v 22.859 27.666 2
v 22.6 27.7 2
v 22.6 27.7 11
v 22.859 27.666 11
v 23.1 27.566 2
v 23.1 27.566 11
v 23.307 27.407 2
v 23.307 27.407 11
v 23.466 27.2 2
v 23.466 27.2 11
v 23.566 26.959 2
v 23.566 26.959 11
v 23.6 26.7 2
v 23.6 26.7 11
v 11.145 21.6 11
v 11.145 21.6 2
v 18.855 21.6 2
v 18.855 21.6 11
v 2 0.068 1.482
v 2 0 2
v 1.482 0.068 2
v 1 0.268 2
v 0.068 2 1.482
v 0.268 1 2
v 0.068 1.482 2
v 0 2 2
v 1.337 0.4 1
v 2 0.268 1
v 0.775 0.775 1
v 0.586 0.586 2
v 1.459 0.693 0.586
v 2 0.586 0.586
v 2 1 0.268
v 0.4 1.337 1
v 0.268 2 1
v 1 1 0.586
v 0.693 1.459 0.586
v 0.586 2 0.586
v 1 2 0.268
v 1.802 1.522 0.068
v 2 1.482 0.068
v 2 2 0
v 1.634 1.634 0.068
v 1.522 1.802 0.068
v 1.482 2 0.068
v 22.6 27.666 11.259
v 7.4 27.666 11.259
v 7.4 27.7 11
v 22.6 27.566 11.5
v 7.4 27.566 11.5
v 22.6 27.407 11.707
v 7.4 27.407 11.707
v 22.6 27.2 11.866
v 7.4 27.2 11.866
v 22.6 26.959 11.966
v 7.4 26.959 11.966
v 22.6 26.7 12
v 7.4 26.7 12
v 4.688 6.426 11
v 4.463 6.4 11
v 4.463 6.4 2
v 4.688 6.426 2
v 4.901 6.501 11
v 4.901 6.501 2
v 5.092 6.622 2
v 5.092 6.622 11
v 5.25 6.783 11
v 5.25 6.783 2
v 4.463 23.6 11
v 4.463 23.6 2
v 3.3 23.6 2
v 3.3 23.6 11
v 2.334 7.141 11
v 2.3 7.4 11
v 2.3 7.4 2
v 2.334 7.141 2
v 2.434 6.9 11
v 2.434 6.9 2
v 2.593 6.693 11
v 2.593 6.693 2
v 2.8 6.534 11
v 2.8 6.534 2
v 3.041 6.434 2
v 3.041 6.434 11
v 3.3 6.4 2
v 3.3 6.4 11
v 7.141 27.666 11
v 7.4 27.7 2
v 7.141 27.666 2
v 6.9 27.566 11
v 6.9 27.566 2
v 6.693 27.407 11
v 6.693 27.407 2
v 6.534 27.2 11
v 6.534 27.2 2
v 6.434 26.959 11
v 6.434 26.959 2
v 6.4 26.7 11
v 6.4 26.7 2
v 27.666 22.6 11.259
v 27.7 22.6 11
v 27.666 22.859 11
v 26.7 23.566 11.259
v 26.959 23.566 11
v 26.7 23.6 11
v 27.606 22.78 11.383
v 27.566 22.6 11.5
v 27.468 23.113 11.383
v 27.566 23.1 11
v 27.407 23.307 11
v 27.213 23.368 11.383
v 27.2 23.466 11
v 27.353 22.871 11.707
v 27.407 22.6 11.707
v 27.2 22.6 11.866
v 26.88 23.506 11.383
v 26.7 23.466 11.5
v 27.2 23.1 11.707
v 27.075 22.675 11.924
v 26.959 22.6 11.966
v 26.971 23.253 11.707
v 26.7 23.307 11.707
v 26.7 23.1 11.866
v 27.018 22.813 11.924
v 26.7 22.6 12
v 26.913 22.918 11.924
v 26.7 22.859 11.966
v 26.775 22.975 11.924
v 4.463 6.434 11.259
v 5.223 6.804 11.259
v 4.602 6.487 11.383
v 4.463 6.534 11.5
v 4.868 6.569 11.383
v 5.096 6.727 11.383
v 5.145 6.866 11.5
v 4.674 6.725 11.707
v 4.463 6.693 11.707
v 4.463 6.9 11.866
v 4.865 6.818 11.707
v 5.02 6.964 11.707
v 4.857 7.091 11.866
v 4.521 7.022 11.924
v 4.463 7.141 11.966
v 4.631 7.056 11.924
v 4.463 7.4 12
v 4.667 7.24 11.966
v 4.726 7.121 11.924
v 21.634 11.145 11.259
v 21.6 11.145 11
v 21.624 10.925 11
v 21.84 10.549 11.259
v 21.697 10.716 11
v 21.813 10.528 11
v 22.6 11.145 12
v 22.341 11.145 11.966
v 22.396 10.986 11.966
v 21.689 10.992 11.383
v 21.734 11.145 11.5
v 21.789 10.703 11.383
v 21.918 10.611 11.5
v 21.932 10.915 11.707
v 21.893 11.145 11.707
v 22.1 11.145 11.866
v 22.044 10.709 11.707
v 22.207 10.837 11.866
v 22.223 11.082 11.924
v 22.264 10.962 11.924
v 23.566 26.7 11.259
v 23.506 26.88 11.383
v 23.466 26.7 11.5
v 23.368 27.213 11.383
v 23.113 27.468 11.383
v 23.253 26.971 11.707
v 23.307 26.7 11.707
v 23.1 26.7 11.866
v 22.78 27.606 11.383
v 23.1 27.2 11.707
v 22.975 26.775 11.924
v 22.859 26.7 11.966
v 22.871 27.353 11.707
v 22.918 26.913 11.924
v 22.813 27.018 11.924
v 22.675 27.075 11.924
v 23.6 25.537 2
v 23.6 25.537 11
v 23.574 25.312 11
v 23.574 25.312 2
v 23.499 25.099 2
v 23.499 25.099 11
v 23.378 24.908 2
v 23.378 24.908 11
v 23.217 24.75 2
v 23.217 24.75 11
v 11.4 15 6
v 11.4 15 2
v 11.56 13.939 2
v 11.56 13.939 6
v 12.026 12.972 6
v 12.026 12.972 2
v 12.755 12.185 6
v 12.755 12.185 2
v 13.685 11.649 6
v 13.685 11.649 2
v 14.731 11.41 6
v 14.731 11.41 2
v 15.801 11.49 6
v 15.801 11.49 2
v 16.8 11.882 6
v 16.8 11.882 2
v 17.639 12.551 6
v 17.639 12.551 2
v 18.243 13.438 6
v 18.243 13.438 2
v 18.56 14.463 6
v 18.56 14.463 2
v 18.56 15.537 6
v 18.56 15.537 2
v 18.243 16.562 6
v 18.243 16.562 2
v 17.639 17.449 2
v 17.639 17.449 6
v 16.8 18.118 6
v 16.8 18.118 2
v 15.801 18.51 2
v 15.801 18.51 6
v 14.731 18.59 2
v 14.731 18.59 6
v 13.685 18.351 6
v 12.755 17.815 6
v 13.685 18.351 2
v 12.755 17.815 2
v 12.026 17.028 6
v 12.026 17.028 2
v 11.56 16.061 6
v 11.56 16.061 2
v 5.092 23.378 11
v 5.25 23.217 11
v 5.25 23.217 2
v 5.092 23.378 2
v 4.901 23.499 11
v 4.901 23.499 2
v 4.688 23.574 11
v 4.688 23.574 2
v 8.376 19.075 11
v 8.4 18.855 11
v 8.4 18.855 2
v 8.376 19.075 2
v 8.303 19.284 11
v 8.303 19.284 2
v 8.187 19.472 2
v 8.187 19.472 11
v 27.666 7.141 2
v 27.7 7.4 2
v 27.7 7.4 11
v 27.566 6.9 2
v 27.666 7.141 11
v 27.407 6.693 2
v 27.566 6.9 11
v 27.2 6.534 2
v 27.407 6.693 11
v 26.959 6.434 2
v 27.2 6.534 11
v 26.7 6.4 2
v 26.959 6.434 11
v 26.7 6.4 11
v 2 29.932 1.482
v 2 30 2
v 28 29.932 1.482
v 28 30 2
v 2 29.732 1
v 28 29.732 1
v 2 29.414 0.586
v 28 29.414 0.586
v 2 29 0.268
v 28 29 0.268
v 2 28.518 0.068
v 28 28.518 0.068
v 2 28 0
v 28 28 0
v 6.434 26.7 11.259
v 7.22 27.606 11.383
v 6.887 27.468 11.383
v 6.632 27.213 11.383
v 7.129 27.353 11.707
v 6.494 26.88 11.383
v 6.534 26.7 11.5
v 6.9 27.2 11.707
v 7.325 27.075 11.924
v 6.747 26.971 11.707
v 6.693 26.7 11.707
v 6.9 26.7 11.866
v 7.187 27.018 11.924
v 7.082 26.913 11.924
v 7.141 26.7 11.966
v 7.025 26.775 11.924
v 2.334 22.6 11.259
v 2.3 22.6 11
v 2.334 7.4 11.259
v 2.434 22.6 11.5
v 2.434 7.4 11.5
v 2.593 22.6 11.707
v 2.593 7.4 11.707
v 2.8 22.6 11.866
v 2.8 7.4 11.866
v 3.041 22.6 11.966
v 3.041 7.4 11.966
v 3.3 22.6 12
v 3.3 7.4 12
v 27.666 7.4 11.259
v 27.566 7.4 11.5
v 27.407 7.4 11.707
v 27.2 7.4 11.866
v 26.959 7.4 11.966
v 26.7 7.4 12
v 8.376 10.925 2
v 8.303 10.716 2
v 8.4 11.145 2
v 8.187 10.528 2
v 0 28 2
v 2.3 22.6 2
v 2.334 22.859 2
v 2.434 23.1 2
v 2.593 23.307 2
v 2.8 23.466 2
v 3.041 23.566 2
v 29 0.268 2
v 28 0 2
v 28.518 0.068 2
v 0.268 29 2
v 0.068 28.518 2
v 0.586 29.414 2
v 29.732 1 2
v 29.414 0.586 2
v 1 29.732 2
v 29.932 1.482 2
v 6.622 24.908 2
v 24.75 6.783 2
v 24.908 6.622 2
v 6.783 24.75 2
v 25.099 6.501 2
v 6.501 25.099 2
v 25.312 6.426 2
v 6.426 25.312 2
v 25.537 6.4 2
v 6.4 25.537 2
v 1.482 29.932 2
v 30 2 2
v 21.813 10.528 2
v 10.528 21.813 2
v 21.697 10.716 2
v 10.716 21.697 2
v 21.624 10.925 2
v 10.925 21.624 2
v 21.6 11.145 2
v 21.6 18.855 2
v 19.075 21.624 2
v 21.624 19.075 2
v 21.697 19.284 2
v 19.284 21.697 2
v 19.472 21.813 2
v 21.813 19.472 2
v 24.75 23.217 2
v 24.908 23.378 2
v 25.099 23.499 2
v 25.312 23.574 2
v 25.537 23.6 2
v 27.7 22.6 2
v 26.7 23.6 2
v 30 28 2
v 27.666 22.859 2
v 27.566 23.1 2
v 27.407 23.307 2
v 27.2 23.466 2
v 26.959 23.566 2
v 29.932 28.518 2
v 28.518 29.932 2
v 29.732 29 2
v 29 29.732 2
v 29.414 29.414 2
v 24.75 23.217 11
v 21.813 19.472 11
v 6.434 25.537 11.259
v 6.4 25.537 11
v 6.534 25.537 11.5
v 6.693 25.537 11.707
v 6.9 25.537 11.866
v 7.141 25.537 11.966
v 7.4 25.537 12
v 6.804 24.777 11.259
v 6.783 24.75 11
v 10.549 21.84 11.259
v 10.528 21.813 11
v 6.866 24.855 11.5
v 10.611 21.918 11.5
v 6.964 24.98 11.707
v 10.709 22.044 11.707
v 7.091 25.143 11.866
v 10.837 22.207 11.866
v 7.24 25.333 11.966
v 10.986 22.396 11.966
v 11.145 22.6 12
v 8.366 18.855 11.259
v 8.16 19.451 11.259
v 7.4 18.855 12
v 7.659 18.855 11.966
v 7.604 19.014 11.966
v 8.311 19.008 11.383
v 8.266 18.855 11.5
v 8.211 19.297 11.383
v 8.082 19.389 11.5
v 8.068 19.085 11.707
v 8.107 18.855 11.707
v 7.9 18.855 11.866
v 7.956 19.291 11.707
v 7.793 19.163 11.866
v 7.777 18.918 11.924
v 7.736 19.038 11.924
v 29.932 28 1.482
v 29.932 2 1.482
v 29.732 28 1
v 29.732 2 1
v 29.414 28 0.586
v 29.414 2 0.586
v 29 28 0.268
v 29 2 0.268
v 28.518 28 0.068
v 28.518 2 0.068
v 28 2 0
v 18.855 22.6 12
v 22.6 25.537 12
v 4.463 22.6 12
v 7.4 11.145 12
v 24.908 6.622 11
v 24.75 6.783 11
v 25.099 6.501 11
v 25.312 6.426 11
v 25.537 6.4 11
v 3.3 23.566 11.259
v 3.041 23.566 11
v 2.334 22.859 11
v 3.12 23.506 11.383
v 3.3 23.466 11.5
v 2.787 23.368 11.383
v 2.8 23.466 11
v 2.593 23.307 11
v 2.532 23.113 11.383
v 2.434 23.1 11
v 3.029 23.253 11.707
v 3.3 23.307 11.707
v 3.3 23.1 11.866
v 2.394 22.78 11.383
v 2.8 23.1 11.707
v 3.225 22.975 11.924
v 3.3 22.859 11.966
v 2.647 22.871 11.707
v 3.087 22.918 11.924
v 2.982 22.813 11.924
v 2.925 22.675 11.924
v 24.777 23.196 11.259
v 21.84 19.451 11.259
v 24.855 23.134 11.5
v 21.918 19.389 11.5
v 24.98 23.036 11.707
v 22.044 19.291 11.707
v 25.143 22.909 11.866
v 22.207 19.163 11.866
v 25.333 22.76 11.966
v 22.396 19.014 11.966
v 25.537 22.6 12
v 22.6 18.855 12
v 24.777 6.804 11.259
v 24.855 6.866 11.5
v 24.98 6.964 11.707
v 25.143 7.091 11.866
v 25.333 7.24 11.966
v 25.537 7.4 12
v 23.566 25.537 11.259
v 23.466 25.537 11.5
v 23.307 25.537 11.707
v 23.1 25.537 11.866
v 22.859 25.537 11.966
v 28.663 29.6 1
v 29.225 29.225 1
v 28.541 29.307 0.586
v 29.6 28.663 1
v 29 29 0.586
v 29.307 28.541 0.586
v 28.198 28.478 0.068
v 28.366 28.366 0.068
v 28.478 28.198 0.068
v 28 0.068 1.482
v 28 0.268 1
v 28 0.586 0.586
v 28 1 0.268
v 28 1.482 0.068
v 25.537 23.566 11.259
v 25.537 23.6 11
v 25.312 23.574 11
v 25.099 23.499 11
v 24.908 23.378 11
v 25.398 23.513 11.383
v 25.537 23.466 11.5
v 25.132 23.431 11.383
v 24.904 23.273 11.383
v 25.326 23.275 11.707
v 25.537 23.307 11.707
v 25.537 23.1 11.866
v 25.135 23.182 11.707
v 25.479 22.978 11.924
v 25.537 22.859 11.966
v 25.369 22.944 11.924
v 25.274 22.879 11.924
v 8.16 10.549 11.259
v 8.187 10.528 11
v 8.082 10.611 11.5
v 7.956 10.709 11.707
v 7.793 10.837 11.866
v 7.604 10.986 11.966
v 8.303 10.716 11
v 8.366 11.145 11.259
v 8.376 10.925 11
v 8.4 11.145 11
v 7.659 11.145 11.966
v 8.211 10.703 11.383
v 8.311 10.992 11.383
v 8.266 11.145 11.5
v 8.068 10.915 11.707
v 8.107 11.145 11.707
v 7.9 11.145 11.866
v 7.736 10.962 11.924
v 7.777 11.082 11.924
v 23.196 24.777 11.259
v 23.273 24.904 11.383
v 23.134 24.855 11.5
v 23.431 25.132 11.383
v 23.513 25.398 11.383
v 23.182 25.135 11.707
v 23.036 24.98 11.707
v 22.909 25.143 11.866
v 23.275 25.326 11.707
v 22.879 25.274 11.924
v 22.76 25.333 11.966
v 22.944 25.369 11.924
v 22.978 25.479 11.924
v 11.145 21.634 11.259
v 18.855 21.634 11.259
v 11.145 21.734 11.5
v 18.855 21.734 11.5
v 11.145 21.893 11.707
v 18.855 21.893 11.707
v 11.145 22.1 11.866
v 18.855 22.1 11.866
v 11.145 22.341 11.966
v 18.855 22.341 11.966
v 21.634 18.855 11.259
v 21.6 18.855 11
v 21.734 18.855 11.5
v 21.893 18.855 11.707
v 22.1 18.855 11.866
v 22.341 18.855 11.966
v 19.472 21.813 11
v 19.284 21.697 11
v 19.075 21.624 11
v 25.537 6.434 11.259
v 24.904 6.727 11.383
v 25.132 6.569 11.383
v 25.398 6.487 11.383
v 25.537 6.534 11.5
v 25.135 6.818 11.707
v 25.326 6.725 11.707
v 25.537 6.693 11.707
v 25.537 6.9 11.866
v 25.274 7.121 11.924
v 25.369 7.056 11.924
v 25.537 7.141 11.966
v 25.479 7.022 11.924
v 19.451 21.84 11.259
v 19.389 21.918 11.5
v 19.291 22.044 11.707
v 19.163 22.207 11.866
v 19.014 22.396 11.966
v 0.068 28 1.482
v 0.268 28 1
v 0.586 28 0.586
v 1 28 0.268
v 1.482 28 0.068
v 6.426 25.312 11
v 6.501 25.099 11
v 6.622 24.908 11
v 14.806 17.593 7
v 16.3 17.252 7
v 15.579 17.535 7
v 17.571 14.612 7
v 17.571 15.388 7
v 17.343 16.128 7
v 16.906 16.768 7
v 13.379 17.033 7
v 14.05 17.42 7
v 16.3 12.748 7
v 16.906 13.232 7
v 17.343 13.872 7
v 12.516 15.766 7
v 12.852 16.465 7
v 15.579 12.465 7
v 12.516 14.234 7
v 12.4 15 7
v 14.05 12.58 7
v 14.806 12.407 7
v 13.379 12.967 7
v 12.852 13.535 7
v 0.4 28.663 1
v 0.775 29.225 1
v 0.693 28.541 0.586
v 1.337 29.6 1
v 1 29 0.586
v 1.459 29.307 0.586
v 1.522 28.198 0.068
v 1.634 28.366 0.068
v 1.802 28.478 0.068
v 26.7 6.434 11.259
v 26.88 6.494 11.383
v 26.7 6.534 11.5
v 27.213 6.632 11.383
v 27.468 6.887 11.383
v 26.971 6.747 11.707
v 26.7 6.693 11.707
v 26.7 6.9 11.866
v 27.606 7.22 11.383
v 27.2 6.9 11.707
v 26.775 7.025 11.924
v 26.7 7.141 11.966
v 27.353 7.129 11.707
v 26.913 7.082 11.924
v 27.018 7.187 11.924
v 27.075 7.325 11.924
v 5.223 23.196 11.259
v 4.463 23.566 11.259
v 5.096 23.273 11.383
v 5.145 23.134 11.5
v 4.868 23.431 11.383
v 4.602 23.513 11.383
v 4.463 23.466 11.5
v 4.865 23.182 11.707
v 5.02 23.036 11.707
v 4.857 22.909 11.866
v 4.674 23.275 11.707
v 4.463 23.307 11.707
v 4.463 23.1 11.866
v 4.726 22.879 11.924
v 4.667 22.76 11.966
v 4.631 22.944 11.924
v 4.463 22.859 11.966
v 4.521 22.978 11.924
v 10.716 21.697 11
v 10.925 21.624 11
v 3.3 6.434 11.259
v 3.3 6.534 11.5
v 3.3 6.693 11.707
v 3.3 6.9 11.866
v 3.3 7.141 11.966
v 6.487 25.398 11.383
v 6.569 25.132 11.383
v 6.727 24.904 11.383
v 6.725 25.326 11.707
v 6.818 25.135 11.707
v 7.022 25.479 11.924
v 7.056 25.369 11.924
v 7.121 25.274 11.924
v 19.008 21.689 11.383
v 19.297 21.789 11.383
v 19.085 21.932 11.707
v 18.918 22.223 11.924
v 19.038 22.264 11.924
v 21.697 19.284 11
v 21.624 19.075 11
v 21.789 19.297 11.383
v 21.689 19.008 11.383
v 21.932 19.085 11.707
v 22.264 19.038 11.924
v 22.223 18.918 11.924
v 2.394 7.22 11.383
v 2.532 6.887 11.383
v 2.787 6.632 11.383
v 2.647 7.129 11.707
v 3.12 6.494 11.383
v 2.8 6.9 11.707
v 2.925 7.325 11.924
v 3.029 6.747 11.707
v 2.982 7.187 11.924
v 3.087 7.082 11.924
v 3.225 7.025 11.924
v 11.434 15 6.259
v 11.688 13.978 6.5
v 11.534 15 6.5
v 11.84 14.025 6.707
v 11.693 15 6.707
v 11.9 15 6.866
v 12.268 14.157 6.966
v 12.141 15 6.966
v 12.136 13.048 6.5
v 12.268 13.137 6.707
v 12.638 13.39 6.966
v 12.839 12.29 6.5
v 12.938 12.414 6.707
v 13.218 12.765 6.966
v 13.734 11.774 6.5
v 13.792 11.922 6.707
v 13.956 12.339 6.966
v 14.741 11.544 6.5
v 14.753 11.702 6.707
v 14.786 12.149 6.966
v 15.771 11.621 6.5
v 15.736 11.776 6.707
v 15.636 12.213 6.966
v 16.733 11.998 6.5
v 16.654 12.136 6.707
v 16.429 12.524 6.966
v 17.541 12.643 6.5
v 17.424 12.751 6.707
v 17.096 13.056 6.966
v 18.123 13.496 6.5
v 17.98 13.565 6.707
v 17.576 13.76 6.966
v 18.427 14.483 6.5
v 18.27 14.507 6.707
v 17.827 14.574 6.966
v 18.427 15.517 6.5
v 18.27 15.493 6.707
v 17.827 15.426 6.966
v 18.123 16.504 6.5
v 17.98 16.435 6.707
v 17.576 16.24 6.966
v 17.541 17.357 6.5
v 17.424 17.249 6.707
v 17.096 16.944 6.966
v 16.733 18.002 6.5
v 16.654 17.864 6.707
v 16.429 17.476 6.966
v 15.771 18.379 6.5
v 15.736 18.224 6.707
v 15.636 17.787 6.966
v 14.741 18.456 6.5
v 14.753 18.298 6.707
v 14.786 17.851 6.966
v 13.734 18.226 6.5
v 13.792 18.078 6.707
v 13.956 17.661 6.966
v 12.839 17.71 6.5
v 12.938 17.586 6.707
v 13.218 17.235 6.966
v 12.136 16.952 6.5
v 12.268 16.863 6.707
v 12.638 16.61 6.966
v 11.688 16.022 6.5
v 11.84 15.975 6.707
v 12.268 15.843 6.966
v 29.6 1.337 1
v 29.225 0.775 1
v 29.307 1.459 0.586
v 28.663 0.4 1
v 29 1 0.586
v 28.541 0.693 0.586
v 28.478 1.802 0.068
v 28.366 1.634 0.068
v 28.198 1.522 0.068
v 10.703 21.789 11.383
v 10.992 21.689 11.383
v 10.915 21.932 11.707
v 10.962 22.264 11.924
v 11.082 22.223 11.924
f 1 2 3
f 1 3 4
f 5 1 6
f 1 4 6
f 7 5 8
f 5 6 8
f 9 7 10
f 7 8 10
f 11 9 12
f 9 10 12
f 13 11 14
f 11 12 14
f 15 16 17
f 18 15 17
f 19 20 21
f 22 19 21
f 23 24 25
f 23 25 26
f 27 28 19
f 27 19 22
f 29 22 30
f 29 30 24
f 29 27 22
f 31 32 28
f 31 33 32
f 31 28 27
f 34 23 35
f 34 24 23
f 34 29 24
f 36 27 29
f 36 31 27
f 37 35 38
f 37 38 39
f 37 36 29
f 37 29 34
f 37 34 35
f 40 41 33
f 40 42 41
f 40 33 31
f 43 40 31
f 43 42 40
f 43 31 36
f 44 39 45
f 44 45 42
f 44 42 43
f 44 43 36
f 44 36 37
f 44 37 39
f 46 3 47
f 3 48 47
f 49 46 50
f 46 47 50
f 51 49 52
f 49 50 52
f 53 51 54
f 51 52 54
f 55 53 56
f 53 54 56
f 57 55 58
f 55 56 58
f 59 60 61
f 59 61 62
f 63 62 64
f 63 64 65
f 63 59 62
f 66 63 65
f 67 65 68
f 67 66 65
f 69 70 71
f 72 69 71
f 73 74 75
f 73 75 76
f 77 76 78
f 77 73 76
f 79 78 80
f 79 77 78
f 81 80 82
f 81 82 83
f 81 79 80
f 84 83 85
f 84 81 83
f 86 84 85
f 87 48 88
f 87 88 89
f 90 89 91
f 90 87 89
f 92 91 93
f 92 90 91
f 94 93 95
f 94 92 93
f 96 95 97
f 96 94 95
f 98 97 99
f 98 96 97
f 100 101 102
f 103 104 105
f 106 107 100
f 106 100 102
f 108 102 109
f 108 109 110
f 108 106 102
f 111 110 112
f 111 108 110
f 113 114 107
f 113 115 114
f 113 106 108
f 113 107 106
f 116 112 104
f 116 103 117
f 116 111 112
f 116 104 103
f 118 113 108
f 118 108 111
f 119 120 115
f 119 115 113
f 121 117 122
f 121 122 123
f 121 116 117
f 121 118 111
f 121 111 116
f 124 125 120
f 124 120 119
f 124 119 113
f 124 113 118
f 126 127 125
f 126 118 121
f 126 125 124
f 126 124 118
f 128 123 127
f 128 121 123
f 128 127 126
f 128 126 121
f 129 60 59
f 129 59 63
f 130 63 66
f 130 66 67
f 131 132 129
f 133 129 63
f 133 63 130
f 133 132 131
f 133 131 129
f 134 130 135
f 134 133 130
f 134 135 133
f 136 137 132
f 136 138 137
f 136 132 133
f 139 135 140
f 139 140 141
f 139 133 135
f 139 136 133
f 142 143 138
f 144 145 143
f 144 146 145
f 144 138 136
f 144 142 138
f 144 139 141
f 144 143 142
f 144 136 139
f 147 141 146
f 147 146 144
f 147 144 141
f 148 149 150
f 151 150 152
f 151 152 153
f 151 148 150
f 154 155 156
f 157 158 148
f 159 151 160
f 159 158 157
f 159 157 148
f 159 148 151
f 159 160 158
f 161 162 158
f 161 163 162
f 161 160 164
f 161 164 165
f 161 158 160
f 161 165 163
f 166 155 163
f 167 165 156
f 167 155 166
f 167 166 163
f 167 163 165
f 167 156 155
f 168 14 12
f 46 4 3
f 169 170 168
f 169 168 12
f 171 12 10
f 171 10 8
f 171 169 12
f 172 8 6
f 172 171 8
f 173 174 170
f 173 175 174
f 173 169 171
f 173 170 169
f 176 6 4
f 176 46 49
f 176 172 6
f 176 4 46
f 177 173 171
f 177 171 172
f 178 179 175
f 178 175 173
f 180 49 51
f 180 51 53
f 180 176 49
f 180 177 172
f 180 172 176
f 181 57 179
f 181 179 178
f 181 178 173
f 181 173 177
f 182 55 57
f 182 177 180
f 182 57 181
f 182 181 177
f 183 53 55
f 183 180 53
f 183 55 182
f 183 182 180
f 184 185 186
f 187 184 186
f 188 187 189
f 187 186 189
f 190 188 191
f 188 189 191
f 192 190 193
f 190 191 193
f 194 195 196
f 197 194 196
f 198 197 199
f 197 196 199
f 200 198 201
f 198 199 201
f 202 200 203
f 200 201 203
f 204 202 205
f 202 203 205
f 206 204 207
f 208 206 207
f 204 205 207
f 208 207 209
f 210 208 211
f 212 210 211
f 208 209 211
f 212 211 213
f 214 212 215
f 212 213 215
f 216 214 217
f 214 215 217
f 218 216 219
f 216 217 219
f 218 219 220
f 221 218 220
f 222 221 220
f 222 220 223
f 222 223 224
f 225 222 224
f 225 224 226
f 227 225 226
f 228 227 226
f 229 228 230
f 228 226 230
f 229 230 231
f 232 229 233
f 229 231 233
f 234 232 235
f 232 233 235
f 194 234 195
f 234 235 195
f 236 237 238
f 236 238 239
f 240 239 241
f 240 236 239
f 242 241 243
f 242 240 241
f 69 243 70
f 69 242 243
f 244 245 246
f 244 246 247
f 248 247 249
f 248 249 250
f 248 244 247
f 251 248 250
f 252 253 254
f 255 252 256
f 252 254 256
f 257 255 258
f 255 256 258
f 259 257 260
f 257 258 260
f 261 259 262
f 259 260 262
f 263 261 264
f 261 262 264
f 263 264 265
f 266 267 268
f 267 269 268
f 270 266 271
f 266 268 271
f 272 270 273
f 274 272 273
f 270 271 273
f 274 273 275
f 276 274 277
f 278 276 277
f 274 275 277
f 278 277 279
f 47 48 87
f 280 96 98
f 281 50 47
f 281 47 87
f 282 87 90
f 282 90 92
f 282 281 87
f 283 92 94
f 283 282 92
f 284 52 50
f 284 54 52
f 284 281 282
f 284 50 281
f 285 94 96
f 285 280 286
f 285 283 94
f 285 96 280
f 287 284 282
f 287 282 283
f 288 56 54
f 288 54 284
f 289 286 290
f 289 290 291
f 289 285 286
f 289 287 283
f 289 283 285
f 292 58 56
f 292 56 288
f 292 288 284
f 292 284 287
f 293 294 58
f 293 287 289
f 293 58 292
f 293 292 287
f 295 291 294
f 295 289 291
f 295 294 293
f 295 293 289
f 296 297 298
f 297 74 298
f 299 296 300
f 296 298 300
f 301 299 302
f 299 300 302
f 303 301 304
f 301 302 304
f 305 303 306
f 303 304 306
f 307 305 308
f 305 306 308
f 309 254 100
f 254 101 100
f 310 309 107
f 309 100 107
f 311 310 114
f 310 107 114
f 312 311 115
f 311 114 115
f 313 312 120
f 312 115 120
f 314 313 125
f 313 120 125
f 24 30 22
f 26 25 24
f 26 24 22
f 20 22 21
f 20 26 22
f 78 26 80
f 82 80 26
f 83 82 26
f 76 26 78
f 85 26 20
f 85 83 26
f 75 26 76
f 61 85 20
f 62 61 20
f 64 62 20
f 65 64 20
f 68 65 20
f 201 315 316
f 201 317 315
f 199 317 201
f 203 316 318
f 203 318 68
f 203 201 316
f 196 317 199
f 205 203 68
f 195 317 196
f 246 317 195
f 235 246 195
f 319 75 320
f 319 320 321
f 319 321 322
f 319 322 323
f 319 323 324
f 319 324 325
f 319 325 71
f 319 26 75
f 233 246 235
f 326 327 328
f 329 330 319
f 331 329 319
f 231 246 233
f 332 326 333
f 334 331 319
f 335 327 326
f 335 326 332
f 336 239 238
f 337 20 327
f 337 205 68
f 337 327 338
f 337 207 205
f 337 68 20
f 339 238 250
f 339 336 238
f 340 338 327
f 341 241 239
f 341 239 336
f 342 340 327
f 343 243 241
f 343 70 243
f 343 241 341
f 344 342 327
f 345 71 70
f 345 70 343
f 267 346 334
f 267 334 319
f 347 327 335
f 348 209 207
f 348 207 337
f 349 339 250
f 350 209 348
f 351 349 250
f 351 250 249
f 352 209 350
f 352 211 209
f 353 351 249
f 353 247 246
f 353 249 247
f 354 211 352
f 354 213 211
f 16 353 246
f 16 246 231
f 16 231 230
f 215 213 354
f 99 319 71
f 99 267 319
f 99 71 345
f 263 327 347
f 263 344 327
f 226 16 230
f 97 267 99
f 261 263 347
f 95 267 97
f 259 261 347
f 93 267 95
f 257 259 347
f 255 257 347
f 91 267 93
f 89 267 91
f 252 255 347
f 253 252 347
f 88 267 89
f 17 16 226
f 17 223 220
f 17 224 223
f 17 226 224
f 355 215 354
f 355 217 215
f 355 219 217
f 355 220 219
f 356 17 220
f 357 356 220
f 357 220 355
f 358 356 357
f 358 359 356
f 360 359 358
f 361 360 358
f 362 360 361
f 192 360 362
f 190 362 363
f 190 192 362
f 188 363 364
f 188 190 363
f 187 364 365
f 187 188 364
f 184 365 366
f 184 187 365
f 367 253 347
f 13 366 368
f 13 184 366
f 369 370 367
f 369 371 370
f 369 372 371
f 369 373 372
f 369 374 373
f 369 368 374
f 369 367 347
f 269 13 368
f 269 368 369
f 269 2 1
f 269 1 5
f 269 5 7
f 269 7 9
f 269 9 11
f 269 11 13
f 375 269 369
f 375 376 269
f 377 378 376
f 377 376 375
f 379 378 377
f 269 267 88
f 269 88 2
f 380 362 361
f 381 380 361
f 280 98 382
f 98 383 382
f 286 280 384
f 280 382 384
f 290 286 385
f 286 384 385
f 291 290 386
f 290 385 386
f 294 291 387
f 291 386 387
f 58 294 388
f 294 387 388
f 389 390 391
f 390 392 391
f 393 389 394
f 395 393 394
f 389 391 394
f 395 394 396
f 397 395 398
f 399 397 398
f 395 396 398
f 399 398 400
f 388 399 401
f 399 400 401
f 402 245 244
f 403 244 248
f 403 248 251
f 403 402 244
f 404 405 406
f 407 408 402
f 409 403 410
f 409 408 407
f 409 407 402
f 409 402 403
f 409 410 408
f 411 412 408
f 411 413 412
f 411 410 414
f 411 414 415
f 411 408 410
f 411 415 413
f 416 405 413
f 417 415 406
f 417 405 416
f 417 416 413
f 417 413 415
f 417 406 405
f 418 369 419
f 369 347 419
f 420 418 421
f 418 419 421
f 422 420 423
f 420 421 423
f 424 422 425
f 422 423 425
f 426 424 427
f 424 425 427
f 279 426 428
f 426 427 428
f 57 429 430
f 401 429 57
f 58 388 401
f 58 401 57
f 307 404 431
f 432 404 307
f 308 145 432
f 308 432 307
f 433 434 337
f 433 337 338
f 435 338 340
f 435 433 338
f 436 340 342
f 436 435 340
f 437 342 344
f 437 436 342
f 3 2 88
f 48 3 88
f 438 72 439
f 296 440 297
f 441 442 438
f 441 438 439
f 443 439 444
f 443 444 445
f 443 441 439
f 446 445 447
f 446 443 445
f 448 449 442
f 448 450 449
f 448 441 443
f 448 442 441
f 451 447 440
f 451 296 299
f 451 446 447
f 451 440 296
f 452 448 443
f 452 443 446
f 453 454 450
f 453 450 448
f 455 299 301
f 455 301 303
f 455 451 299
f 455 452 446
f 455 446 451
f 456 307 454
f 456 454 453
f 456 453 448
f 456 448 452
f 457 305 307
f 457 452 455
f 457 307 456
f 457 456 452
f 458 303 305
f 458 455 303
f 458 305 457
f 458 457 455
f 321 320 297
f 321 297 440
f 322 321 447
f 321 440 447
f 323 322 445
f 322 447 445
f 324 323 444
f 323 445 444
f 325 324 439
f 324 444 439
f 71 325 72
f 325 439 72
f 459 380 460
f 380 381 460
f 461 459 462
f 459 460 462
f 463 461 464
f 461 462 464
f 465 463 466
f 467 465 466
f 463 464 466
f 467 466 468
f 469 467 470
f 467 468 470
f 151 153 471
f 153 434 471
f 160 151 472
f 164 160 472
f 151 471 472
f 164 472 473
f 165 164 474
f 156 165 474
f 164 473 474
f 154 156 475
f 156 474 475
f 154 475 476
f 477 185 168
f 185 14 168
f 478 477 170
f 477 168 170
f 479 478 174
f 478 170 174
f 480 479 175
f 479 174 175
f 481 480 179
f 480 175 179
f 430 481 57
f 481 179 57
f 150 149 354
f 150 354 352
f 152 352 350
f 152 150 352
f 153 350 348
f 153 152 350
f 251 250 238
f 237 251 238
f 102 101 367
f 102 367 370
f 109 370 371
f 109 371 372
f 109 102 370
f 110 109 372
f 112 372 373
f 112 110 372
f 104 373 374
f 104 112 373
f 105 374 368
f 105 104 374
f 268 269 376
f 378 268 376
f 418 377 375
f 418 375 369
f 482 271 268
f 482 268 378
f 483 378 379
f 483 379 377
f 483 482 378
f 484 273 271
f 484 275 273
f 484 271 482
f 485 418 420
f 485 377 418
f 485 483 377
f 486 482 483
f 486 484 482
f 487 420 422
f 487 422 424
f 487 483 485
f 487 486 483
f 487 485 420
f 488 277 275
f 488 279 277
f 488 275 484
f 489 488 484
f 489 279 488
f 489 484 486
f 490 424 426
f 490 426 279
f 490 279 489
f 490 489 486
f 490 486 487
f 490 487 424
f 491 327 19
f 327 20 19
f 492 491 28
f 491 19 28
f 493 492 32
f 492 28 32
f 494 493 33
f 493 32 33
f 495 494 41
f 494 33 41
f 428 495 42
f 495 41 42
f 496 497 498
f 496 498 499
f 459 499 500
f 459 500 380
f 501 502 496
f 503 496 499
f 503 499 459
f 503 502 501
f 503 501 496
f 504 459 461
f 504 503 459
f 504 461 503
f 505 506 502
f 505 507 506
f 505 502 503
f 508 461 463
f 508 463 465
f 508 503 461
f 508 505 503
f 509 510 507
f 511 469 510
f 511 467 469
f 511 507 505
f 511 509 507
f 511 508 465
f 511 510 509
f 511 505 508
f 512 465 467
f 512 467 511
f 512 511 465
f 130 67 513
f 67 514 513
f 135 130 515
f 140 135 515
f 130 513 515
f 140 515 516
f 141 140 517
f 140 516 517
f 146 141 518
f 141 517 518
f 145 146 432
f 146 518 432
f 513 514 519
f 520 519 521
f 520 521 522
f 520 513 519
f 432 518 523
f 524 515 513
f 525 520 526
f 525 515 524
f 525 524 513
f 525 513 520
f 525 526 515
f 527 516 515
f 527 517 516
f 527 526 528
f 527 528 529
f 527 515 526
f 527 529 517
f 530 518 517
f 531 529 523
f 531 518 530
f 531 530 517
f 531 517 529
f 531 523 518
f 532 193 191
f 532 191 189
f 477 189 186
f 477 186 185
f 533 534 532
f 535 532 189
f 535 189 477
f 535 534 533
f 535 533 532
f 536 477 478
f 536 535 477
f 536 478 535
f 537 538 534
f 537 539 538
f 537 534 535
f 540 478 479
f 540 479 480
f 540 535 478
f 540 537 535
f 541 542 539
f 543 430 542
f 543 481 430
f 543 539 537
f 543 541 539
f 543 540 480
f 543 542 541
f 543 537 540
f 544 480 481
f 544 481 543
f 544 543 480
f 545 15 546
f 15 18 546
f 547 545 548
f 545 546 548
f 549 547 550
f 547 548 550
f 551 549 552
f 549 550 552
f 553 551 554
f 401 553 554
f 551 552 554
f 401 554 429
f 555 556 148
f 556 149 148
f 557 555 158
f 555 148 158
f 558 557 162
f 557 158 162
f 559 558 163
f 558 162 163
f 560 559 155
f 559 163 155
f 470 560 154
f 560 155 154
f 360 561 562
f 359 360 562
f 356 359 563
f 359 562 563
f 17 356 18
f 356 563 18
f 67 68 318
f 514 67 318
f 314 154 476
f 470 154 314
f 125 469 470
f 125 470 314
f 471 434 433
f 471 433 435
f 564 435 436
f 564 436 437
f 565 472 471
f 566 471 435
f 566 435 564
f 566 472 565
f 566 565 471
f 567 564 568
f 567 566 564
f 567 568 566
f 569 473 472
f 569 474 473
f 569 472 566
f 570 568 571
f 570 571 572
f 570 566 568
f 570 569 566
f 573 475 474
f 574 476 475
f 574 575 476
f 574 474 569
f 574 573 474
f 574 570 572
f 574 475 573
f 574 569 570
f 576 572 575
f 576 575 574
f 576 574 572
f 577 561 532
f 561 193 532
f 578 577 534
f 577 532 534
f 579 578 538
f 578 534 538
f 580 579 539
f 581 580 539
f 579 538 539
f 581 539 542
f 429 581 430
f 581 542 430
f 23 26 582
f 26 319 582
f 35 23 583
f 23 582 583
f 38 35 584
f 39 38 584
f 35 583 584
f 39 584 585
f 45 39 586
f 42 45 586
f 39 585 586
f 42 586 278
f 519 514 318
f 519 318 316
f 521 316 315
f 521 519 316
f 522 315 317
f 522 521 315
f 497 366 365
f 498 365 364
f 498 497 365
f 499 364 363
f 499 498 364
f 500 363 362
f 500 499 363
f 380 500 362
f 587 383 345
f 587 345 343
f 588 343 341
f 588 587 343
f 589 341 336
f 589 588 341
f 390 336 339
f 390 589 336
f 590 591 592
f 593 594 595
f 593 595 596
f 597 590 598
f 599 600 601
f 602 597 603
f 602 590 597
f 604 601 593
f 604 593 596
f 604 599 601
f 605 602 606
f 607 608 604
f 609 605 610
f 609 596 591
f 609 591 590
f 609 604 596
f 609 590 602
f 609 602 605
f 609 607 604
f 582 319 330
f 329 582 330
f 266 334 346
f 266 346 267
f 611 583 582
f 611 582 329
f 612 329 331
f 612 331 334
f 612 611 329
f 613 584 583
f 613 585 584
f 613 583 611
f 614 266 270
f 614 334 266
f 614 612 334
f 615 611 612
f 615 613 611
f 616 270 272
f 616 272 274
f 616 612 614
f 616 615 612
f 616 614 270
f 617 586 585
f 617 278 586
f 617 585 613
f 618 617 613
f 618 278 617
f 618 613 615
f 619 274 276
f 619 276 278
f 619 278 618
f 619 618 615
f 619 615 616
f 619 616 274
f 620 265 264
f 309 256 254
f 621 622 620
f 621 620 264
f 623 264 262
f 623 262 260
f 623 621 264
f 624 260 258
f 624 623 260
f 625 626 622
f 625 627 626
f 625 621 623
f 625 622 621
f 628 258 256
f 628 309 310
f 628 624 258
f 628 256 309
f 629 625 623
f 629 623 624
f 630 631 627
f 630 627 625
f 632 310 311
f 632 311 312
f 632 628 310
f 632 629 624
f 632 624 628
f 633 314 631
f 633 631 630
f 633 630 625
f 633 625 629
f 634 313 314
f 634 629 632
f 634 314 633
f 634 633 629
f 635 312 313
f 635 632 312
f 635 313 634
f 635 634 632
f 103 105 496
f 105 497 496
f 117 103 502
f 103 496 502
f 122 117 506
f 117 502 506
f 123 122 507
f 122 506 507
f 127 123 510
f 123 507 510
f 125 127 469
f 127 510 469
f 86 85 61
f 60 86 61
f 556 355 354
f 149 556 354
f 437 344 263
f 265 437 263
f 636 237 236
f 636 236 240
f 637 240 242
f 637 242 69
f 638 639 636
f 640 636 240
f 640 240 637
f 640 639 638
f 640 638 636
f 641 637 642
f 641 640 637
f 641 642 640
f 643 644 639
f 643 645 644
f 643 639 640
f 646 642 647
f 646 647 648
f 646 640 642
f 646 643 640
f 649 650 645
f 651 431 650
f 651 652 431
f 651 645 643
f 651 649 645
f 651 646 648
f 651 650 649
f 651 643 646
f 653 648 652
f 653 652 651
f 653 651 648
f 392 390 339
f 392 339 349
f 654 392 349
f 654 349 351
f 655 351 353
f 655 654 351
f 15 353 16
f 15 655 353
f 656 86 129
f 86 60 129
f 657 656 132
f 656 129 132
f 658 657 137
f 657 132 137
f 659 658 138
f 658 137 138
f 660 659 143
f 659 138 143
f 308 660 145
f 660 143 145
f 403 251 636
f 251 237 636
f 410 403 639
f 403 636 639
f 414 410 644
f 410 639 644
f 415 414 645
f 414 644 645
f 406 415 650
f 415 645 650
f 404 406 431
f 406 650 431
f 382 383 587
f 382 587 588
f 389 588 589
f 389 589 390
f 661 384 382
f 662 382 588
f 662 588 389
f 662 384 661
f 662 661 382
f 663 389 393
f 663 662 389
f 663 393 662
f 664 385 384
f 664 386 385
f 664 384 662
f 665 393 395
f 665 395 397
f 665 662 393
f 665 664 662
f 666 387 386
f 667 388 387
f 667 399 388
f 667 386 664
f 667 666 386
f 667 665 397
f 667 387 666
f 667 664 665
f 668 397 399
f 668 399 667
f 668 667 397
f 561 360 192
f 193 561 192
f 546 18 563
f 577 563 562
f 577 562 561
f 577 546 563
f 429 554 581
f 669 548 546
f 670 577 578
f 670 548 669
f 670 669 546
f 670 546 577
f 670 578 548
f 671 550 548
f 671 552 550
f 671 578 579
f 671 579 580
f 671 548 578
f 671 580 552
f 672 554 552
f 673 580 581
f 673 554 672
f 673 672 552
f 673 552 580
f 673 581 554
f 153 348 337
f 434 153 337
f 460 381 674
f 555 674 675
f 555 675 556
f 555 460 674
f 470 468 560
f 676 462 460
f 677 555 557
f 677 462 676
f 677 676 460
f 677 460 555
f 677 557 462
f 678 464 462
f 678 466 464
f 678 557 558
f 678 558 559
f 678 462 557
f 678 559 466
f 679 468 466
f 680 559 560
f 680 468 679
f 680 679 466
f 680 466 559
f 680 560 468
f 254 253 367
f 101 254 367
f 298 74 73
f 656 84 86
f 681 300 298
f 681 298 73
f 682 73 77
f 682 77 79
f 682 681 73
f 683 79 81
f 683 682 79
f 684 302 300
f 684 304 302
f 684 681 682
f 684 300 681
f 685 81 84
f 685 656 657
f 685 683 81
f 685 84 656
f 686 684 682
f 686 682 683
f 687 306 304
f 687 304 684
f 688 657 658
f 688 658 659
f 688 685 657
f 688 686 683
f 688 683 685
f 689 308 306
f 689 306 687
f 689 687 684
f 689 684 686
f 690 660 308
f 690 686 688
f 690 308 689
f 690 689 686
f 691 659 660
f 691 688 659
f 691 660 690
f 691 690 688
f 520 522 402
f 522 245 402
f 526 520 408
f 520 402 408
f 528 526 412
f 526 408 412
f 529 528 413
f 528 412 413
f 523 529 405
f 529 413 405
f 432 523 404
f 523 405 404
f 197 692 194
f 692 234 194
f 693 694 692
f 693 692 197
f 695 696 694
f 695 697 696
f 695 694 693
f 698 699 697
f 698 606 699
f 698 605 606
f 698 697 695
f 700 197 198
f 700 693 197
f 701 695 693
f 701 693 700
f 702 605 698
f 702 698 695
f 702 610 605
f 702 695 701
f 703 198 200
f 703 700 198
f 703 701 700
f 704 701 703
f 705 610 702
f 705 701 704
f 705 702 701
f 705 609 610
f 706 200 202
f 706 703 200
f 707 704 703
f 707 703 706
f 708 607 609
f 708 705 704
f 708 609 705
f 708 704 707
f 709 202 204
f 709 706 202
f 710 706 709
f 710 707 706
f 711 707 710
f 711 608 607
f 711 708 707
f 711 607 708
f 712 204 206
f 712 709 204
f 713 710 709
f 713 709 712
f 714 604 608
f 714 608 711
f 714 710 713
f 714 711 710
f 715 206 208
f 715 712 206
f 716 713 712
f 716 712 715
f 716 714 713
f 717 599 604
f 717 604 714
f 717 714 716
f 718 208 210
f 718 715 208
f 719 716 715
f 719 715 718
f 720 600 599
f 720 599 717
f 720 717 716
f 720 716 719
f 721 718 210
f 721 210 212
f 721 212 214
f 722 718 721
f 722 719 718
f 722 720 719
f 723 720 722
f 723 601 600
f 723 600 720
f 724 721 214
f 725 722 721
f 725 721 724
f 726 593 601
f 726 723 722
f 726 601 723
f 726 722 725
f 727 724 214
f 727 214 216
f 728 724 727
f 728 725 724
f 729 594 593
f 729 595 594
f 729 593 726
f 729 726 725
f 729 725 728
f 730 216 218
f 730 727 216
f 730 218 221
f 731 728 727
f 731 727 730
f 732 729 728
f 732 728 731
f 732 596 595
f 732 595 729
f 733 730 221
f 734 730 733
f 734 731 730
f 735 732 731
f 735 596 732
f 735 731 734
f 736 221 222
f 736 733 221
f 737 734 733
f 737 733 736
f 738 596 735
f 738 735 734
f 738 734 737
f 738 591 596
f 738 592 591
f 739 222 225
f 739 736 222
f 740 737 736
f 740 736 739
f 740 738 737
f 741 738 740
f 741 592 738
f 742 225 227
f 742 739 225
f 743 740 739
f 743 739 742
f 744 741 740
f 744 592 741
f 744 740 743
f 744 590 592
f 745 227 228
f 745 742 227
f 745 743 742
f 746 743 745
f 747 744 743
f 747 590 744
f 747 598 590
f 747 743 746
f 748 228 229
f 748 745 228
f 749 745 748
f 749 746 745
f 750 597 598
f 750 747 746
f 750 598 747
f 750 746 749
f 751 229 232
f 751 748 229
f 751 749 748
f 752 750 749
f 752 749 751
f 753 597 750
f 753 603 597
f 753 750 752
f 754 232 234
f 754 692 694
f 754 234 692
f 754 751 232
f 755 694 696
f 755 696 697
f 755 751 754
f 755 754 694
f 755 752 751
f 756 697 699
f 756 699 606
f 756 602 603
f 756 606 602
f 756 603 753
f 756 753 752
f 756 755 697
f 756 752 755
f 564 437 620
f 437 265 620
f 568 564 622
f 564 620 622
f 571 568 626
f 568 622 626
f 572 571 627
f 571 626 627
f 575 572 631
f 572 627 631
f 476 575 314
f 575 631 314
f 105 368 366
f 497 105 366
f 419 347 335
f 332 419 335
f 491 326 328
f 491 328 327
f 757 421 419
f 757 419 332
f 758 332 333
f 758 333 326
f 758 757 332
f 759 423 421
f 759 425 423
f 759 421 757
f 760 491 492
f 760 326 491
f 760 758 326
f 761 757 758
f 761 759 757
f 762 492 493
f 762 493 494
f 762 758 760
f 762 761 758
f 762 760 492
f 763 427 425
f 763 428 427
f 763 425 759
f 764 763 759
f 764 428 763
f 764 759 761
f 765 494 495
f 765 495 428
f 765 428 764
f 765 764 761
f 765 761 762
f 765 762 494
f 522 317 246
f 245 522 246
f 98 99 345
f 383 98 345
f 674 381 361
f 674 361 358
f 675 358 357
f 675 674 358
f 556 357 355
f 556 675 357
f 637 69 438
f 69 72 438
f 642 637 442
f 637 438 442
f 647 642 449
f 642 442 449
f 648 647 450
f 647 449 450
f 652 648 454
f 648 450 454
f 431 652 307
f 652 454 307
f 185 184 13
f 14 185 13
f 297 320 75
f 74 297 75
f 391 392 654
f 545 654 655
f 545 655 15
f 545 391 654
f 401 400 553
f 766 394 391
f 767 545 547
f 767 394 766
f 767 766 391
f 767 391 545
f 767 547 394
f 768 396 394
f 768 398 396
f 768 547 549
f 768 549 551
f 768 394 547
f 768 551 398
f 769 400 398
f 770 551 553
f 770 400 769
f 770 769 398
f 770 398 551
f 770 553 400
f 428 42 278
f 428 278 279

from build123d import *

# Parameters (mm, degrees)
ESQUISSE1_W                        = 30
ESQUISSE1_H                        = 30
BOSS_EXTRU_1_DEPTH                 = 2
BOSS_EXTRU_5_DEPTH                 = 10
CONG_1_R                           = 1
ESQUISSE2_R                        = 3.6
BOSS_EXTRU_6_DEPTH                 = 5
R_P_TITION_CIRCULAIRE1_COUNT       = 3
R_P_TITION_CIRCULAIRE1_ANGLE       = 180
CONG_1_OF_R_P_TITION_CIRCULAIRE1_R = 1
CONG_2_R                           = 2
CONG_3_R                           = 1
CONG_4_R                           = 2


with BuildPart() as part:
    # Esquisse1 → Boss.-Extru.1 (new body)
    with BuildSketch(Plane.XY):
        with Locations((15, 15)):
            Rectangle(ESQUISSE1_W, ESQUISSE1_H)
    extrude(amount=BOSS_EXTRU_1_DEPTH)

    # Esquisse5 → Boss.-Extru.5 (add)
    with BuildSketch(Plane.XY.offset(2)):
        Polygon((27.7, 6.4), (27.7, 23.6), (25.05, 23.6), (21.6, 19.2), (21.6, 10.8), (25.05, 6.4), align=None)
    boss_extru_5 = extrude(amount=BOSS_EXTRU_5_DEPTH)

    # Congé1
    cong_1_edges = [part.edges().sort_by_distance(p)[0] for p in [
        (25.05, 6.4, 7),
        (27.7, 6.4, 7),
        (27.7, 23.6, 7),
        (25.05, 23.6, 7),
        (21.6, 19.2, 7),
        (21.6, 10.8, 7),
    ]]
    fillet(cong_1_edges, radius=CONG_1_R)

    # Esquisse2 → Boss.-Extru.6 (add)
    with BuildSketch(Plane.XY.offset(2)):
        with Locations(Location((15, 15, 0), (0, 0, 180))):
            Circle(ESQUISSE2_R)
    extrude(amount=BOSS_EXTRU_6_DEPTH)

    # Répétition circulaire1: Boss.-Extru.5 ×3 about axis
    r_p_tition_circulaire1_axis = Axis((15, 15, 0), (0, 0, 1))
    for i in range(1, R_P_TITION_CIRCULAIRE1_COUNT):
        add(boss_extru_5.rotate(r_p_tition_circulaire1_axis, i * R_P_TITION_CIRCULAIRE1_ANGLE / (R_P_TITION_CIRCULAIRE1_COUNT - 1)))

    # Congé1 of Répétition circulaire1
    cong_1_of_r_p_tition_circulaire1_edges = [part.edges().sort_by_distance(p)[0] for p in [
        (23.6, 25.05, 7),
        (23.6, 27.7, 7),
        (6.4, 27.7, 7),
        (6.4, 25.05, 7),
        (10.8, 21.6, 7),
        (19.2, 21.6, 7),
        (4.95, 23.6, 7),
        (2.3, 23.6, 7),
        (2.3, 6.4, 7),
        (4.95, 6.4, 7),
        (8.4, 10.8, 7),
        (8.4, 19.2, 7),
    ]]
    fillet(cong_1_of_r_p_tition_circulaire1_edges, radius=CONG_1_OF_R_P_TITION_CIRCULAIRE1_R)

    # Congé2
    cong_2_edges = [part.edges().sort_by_distance(p)[0] for p in [
        (0, 30, 1),
        (30, 30, 1),
        (30, 0, 1),
        (0, 0, 1),
    ]]
    fillet(cong_2_edges, radius=CONG_2_R)

    # Congé3
    cong_3_edges = [part.edges().sort_by_distance(p)[0] for p in [
        (15, 27.7, 12),
        (23.6, 26.118328167, 12),
        (6.4, 26.118328167, 12),
        (8.655619048, 23.28138961, 12),
        (15, 21.6, 12),
        (21.344380952, 23.28138961, 12),
        (6.500824998, 25.099067124, 12),
        (10.818910387, 21.654764961, 12),
        (19.181089613, 21.654764961, 12),
        (23.499175002, 25.099067124, 12),
        (6.692893219, 27.407106781, 12),
        (23.307106781, 27.407106781, 12),
        (2.3, 15, 12),
        (3.881671833, 23.6, 12),
        (3.881671833, 6.4, 12),
        (6.71861039, 8.655619048, 12),
        (8.4, 15, 12),
        (6.71861039, 21.344380952, 12),
        (4.900932876, 6.500824998, 12),
        (8.345235039, 10.818910387, 12),
        (8.345235039, 19.181089613, 12),
        (4.900932876, 23.499175002, 12),
        (2.592893219, 6.692893219, 12),
        (2.592893219, 23.307106781, 12),
        (27.7, 15, 12),
        (26.118328167, 6.4, 12),
        (26.118328167, 23.6, 12),
        (23.28138961, 21.344380952, 12),
        (21.6, 15, 12),
        (23.28138961, 8.655619048, 12),
        (25.099067124, 23.499175002, 12),
        (21.654764961, 19.181089613, 12),
        (21.654764961, 10.818910387, 12),
        (25.099067124, 6.500824998, 12),
        (27.407106781, 23.307106781, 12),
        (27.407106781, 6.692893219, 12),
        (18.6, 15, 7),
    ]]
    fillet(cong_3_edges, radius=CONG_3_R)

    # Congé4
    cong_4_edges = [part.edges().sort_by_distance(p)[0] for p in [
        (29.414213562, 29.414213562, 0),
        (15, 30, 0),
        (0.585786438, 29.414213562, 0),
        (0, 15, 0),
        (0.585786438, 0.585786438, 0),
        (15, 0, 0),
        (29.414213562, 0.585786438, 0),
        (30, 15, 0),
    ]]
    fillet(cong_4_edges, radius=CONG_4_R - 0.0001)  # a hair under: the kernel refuses the full size


solid = part.part
